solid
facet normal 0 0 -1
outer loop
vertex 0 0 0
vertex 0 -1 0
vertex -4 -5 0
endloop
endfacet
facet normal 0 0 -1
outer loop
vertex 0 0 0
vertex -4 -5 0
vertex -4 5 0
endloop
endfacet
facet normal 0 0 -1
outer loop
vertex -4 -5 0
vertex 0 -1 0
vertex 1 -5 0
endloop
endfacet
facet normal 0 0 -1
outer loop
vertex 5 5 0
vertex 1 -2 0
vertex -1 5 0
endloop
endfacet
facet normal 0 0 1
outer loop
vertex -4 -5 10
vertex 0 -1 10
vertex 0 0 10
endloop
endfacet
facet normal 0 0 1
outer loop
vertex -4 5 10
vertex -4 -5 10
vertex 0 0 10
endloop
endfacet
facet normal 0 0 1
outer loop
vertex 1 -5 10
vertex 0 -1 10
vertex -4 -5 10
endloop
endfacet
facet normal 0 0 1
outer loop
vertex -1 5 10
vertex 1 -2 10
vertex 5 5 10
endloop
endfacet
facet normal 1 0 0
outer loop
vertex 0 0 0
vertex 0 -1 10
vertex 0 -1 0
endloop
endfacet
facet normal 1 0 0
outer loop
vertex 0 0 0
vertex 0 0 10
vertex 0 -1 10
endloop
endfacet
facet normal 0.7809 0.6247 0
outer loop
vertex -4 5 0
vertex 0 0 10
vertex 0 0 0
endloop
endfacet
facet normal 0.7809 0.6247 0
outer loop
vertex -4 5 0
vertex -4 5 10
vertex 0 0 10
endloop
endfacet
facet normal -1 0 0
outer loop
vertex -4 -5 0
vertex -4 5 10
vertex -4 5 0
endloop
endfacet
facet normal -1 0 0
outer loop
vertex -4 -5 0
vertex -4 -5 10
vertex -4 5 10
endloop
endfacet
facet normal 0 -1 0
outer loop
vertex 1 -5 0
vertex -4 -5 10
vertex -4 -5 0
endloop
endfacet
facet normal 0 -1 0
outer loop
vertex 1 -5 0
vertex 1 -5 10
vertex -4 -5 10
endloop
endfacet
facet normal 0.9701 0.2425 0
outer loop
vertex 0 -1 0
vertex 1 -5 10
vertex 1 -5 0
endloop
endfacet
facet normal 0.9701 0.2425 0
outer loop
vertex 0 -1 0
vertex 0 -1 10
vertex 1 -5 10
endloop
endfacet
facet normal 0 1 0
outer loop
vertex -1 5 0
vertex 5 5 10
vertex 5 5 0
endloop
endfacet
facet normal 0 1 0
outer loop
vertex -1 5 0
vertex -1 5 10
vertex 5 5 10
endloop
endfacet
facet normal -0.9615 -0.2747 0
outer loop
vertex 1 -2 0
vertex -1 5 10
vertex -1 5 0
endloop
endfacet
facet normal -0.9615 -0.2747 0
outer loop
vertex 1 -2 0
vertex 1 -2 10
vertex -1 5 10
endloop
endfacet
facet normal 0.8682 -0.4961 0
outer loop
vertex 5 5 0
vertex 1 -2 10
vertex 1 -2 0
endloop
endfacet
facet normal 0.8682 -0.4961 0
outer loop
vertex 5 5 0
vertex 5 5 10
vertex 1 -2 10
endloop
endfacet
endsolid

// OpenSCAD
/* use with -gran=0.5 */
linear_extrude(height = 10) {
    polygon(
        points=[
            [ 0, 0],
            [ 0, -1],
            [ 1, -5],
            [-4, -5],
            [-4, +5],
        ]
    );
    polygon(
        points=[
            [-1, +5],
            [+1, -2],
            [+5, +5]
        ]
    );
}
